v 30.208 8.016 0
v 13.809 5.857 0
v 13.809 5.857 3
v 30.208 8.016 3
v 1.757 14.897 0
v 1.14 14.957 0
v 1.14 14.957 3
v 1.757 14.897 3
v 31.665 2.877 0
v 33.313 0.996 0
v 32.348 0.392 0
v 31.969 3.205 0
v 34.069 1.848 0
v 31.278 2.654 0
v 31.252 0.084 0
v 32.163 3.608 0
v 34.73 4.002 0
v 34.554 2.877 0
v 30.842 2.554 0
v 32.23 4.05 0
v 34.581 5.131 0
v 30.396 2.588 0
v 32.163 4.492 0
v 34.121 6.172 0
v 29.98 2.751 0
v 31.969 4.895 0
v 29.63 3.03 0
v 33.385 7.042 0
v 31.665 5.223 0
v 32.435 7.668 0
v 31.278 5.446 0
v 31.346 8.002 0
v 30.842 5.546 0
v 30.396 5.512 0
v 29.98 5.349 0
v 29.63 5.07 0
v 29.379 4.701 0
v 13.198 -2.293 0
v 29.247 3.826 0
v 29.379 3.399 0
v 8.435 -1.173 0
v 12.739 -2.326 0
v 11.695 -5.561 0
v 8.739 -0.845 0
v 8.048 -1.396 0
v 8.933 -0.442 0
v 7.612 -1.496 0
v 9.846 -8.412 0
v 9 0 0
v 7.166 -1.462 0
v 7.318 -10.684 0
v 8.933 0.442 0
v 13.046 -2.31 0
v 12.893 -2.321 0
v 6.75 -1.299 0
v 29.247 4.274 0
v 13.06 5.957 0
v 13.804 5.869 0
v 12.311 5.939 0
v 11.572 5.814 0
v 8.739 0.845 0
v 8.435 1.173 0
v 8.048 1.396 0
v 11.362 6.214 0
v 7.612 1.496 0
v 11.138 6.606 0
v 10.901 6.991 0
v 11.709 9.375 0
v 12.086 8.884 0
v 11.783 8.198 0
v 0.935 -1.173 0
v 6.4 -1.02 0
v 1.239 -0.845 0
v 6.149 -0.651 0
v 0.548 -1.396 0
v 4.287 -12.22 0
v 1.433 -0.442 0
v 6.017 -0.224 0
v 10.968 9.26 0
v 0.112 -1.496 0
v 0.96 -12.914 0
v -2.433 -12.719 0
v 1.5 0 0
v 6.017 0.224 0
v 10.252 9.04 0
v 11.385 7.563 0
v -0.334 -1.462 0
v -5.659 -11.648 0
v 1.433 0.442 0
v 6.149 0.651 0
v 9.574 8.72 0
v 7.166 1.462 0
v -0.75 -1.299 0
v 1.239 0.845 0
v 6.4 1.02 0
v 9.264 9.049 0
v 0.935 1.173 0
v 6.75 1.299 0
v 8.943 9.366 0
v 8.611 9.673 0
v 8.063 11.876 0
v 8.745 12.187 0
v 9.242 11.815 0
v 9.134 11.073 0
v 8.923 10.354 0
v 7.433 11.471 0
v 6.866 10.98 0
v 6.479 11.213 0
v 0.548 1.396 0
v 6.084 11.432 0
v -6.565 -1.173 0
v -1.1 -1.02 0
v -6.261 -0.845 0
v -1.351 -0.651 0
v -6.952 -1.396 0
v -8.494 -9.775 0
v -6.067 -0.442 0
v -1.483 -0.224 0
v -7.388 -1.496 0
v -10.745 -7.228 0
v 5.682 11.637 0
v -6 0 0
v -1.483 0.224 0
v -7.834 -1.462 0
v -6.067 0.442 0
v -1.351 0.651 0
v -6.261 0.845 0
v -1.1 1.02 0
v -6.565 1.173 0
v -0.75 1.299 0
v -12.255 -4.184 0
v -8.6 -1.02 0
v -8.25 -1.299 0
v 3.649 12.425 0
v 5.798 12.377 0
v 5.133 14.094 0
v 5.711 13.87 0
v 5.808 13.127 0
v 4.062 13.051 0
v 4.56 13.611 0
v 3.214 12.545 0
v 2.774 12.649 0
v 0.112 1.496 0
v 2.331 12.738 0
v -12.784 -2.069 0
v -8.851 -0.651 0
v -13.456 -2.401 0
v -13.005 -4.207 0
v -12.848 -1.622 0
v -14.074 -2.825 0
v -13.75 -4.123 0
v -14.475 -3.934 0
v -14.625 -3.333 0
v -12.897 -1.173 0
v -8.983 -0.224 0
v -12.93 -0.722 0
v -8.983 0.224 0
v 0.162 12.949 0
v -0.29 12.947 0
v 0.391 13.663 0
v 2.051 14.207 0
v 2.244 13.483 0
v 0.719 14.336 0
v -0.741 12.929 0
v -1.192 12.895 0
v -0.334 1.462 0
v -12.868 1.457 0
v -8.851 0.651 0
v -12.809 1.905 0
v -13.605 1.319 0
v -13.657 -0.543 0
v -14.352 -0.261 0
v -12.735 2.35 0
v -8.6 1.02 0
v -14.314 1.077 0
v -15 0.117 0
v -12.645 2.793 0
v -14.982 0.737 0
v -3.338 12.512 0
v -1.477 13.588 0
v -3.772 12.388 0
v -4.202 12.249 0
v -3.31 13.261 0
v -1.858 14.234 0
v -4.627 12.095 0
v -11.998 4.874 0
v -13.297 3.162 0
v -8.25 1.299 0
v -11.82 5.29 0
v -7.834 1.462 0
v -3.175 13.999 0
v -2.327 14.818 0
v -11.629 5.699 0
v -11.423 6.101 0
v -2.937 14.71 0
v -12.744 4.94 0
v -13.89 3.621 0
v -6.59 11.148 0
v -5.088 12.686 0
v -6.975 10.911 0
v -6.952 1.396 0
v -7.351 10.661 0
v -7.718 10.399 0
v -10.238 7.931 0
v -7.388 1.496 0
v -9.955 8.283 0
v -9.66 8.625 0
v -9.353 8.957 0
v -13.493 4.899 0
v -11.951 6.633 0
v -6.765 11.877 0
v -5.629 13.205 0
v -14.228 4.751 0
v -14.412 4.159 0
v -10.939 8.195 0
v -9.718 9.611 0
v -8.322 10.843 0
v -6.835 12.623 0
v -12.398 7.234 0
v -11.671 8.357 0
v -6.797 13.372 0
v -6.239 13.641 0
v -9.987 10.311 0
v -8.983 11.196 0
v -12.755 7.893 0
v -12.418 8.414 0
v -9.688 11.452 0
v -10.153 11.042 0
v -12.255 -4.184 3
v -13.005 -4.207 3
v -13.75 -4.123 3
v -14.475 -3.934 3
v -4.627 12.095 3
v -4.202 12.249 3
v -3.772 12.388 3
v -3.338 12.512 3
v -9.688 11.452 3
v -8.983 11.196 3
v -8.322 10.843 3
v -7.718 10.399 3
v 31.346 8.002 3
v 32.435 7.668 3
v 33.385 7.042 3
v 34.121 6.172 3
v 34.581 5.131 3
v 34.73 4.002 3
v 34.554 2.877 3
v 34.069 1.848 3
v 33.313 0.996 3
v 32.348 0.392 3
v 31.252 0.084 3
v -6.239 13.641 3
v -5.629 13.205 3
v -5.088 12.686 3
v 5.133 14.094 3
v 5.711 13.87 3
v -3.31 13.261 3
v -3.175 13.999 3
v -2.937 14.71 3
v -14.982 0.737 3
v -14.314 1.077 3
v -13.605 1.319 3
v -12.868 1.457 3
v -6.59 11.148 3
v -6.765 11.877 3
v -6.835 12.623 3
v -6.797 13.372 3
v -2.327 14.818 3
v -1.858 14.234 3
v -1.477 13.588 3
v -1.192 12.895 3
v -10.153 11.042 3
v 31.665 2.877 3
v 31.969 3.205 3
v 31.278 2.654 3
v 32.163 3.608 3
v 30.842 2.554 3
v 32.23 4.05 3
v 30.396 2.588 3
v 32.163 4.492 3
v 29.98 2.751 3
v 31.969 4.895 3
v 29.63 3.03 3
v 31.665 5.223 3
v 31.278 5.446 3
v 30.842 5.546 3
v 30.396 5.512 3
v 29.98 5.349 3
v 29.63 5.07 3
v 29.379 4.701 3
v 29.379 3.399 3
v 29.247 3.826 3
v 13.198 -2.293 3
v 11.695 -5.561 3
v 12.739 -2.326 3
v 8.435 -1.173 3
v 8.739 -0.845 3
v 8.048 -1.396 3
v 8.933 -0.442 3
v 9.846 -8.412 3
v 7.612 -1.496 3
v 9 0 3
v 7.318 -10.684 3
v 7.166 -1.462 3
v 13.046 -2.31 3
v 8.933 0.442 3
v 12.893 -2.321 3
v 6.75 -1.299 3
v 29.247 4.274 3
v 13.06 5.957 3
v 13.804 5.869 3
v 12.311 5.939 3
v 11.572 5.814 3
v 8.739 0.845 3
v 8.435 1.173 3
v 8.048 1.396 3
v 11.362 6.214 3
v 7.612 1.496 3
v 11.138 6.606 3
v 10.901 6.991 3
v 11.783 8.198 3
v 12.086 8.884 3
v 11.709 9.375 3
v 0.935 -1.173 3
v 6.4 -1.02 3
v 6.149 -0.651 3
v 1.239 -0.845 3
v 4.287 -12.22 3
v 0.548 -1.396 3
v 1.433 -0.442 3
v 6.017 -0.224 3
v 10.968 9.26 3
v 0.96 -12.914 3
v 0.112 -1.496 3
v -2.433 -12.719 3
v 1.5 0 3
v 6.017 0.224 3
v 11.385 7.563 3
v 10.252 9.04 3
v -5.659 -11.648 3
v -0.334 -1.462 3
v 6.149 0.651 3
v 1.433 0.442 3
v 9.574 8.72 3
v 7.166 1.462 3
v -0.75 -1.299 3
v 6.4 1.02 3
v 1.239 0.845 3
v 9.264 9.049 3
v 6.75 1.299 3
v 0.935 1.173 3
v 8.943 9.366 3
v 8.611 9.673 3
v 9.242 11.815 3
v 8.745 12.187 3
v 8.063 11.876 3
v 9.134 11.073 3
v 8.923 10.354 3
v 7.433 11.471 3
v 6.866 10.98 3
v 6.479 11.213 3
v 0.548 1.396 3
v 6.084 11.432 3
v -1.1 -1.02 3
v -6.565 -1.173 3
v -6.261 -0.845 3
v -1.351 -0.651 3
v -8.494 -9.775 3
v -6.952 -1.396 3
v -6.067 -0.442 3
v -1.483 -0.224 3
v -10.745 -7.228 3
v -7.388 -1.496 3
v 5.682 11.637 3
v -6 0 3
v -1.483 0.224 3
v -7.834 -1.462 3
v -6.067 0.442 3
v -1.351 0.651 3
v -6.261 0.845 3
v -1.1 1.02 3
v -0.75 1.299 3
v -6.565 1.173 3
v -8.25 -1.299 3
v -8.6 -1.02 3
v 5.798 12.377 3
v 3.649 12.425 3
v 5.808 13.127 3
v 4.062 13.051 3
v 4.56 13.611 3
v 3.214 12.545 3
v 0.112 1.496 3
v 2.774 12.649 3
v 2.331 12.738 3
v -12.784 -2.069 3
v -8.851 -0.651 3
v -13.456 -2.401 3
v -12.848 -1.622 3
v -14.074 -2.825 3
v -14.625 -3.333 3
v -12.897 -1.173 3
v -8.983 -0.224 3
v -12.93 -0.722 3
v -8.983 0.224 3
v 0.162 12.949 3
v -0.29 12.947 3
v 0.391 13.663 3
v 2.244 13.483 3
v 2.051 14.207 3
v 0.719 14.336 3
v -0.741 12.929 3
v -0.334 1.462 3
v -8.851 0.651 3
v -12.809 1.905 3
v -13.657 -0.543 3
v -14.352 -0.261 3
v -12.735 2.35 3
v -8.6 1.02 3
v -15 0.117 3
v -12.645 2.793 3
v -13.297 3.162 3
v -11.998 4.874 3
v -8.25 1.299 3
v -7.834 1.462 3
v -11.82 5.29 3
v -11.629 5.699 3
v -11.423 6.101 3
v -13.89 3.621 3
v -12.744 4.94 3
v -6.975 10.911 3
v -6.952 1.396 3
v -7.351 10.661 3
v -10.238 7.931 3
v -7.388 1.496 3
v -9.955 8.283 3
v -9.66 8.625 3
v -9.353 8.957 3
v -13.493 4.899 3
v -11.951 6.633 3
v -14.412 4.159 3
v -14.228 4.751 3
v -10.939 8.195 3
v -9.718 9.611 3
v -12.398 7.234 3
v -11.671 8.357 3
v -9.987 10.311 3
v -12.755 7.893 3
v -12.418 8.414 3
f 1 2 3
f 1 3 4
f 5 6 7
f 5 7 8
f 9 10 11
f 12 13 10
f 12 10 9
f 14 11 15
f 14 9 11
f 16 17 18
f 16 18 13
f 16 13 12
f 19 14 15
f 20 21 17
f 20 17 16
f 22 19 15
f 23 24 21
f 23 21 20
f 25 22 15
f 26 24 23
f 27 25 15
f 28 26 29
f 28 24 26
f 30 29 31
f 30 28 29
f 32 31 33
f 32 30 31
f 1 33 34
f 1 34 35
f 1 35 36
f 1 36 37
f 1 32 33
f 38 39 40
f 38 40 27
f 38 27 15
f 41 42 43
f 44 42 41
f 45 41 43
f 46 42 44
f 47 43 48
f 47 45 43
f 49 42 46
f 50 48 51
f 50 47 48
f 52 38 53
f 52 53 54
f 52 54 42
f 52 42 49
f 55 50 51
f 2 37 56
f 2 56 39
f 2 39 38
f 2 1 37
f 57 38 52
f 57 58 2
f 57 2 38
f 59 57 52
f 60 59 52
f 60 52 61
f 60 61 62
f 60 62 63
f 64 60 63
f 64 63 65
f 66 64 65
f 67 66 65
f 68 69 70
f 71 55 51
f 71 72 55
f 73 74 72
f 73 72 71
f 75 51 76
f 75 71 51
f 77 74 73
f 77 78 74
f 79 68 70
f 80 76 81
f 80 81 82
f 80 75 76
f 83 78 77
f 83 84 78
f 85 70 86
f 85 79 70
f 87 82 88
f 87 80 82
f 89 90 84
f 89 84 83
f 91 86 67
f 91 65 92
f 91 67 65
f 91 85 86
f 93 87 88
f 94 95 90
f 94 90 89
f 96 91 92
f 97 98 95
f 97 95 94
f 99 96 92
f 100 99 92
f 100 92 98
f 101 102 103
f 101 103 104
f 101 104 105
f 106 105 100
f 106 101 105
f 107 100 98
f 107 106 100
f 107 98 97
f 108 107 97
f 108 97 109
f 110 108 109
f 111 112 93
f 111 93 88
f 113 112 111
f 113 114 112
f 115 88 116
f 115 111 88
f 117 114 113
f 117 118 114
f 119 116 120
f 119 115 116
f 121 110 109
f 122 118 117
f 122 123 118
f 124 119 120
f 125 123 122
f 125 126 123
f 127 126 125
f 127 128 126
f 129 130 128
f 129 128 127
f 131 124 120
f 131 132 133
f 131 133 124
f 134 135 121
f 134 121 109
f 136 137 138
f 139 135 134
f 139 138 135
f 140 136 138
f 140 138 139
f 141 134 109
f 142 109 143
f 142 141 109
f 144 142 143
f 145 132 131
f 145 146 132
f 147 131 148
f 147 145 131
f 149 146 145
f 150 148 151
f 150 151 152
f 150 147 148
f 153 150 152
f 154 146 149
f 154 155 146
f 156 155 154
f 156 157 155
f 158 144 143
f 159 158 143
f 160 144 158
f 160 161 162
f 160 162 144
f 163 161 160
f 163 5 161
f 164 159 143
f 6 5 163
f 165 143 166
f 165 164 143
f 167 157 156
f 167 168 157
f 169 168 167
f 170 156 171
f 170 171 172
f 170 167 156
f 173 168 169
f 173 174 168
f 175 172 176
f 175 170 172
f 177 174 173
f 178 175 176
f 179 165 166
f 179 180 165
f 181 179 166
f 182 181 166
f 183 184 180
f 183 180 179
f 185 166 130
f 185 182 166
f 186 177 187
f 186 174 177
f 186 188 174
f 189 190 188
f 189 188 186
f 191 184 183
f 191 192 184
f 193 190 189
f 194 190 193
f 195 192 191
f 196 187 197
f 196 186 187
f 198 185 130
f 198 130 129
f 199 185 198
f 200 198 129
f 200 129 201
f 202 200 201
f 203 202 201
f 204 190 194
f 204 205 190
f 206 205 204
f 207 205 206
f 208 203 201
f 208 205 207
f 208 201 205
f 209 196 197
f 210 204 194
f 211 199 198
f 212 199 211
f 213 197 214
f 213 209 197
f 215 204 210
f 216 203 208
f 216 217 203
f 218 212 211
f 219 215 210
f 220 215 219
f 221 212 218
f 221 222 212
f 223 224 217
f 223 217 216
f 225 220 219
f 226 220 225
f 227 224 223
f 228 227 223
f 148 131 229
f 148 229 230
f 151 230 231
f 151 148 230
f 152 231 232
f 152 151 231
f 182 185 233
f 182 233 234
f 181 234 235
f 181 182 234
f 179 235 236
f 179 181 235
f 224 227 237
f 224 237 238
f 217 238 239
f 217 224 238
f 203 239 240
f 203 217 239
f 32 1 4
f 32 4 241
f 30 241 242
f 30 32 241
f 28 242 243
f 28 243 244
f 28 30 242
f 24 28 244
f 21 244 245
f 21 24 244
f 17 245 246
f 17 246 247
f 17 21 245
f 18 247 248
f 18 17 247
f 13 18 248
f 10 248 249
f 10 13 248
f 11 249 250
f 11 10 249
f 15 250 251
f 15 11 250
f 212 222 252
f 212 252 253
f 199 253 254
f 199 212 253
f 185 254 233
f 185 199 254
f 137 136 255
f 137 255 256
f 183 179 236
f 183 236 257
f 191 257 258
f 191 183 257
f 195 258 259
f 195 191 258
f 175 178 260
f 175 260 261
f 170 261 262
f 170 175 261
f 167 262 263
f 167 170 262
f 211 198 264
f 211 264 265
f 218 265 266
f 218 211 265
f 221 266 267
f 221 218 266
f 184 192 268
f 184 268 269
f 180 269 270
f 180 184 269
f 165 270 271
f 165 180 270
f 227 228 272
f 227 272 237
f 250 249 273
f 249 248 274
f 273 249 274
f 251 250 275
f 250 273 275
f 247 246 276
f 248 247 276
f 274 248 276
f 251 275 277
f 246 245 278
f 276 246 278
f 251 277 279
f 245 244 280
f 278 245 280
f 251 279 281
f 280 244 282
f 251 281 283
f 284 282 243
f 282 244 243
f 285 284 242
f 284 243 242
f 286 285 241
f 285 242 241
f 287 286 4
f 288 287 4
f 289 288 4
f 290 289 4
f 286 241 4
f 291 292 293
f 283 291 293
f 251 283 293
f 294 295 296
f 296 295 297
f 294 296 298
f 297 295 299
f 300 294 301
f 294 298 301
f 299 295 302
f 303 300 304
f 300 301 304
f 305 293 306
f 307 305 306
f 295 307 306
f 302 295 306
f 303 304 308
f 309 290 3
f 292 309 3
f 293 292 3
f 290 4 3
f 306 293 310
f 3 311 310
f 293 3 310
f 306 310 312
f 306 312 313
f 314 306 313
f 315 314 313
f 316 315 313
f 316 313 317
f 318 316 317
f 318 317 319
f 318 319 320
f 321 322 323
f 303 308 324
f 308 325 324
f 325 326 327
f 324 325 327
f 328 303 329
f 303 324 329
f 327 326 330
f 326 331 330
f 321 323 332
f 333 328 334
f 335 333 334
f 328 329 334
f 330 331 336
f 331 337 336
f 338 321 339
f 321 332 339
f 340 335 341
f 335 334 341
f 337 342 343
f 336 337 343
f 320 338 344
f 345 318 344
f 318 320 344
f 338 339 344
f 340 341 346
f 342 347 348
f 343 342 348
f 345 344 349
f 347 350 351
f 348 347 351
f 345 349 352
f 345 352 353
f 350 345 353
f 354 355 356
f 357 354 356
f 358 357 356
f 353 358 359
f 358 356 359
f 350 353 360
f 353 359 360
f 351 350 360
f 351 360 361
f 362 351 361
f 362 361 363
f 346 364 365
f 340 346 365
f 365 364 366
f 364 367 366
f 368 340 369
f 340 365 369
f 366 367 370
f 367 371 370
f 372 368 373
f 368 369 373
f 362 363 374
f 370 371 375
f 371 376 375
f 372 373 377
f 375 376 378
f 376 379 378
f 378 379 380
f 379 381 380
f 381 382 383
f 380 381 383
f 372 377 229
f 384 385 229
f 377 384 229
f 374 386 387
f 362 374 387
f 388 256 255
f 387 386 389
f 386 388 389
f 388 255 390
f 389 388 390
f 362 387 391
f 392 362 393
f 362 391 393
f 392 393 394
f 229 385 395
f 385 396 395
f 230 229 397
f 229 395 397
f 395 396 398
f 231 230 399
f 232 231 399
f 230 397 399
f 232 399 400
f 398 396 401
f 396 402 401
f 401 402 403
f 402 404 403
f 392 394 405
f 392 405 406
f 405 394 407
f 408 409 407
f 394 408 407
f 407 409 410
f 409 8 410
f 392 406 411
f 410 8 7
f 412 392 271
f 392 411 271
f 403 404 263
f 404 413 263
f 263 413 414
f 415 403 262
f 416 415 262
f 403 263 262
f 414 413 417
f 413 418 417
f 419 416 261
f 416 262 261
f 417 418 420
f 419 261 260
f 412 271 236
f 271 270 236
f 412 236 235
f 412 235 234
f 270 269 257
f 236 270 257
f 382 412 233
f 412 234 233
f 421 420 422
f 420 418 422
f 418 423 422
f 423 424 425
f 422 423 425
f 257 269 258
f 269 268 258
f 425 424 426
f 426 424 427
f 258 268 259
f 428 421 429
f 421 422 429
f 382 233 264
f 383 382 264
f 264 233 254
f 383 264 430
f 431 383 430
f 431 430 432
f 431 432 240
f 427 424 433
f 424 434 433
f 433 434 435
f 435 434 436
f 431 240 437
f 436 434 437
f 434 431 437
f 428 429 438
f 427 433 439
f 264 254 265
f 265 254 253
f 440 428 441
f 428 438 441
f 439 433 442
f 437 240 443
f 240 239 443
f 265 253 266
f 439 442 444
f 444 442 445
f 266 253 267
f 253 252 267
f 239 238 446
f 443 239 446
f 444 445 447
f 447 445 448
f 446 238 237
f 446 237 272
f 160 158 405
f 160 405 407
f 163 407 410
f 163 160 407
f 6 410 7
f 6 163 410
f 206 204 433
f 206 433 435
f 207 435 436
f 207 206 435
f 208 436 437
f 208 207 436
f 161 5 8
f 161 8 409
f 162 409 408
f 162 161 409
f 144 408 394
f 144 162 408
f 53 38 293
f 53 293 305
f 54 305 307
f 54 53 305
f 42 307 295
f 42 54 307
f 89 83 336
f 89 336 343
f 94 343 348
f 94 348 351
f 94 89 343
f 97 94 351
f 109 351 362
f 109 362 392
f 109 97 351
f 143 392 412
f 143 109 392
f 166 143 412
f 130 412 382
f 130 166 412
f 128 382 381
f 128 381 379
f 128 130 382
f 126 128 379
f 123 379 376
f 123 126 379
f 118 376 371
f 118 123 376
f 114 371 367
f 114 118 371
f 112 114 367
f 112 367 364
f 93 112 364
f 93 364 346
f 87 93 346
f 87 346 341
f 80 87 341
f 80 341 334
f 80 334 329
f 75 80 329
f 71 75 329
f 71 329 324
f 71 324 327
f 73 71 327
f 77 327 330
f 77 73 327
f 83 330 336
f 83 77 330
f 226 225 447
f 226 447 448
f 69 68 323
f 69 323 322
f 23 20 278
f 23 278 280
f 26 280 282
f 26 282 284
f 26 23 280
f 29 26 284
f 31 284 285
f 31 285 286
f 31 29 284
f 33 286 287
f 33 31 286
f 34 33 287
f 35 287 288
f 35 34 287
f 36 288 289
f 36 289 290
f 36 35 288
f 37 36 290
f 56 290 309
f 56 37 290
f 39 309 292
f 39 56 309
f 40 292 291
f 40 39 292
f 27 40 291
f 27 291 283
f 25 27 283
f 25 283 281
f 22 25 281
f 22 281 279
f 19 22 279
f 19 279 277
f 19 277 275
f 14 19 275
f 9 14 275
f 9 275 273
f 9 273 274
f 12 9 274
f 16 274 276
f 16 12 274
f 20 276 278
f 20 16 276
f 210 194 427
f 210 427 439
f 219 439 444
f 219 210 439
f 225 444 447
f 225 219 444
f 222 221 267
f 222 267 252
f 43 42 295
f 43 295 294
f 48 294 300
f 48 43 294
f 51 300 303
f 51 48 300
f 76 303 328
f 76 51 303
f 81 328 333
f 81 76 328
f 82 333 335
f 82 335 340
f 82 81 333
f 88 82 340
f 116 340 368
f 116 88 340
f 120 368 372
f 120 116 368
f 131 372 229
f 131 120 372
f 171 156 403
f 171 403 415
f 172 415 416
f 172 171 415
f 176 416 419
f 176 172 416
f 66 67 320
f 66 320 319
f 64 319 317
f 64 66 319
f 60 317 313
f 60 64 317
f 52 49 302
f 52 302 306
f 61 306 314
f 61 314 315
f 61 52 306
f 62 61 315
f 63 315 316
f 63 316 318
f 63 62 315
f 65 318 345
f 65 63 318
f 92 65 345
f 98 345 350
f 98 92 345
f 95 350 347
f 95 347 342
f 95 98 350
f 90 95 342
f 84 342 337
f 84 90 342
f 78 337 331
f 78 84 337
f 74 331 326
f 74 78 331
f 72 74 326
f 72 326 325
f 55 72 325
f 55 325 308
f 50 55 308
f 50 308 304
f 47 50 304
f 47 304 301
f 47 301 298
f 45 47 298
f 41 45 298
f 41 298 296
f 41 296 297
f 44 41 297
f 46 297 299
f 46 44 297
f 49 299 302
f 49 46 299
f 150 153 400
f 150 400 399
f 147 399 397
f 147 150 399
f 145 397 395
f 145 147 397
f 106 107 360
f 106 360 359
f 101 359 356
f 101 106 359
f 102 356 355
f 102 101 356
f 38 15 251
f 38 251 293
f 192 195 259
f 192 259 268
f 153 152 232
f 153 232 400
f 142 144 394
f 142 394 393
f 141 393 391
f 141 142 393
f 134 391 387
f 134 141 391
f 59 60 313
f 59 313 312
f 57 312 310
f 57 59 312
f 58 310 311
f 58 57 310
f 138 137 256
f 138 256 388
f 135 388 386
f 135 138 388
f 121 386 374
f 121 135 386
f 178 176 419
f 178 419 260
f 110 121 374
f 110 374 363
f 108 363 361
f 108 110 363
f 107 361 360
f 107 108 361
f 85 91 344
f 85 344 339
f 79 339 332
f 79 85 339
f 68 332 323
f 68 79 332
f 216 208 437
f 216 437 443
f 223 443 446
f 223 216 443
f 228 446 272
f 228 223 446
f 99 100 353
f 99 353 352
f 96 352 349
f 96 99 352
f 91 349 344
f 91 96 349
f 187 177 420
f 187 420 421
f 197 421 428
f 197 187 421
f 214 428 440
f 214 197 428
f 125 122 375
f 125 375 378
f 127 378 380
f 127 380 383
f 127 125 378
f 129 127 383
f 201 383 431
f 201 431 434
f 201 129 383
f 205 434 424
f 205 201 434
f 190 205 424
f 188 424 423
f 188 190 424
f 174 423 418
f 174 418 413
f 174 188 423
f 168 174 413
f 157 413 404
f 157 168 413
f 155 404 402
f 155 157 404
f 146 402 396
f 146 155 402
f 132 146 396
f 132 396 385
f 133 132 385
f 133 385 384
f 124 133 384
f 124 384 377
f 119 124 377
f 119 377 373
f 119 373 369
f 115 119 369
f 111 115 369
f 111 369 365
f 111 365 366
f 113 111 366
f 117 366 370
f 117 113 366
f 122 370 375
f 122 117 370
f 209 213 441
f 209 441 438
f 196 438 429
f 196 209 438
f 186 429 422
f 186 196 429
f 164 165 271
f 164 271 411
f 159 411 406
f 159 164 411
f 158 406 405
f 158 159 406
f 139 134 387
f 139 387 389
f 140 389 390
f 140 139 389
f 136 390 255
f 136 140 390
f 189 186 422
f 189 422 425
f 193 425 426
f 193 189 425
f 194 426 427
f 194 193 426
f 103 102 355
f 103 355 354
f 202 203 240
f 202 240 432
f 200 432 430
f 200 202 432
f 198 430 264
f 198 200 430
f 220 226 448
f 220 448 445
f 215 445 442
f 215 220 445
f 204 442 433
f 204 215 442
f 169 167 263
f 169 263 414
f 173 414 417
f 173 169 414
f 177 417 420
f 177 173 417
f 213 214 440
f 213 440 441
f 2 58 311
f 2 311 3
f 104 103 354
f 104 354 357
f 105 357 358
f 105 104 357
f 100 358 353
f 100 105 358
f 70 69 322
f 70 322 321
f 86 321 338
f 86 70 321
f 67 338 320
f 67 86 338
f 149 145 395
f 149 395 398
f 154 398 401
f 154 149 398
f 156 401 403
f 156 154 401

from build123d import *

# Parameters (mm, degrees)
SKETCH1_R           = 1.5
BOSS_EXTRUDE1_DEPTH = 3


with BuildPart() as part:
    # Sketch1 → Boss-Extrude1 (new body)
    with BuildSketch(Plane.XY):
        with BuildLine():
            Line((31.252104769, 0.084220555), (13.197893843, -2.292661406))
            ThreePointArc((13.197893843, -2.292661406), (12.969095602, -2.316113876), (12.73932764, -2.326377285))
            ThreePointArc((12.73932764, -2.326377285), (0.959824701, -12.914380997), (-12.255459075, -4.184043841))
            ThreePointArc((-12.255459075, -4.184043841), (-13.378578492, -4.178547185), (-14.474839872, -3.934337388))
            Line((-14.474839872, -3.934337388), (-14.625059689, -3.332810991))
            ThreePointArc((-14.625059689, -3.332810991), (-13.772322314, -2.601875695), (-12.783651334, -2.068999412))
            ThreePointArc((-12.783651334, -2.068999412), (-12.874361077, -1.397614704), (-12.929834926, -0.722404858))
            ThreePointArc((-12.929834926, -0.722404858), (-14.009823049, -0.414098041), (-14.999545068, 0.116823575))
            Line((-14.999545068, 0.116823575), (-14.981904447, 0.736572564))
            ThreePointArc((-14.981904447, 0.736572564), (-13.963584904, 1.210337006), (-12.867808226, 1.456712552))
            ThreePointArc((-12.867808226, 1.456712552), (-12.774016779, 2.12767369), (-12.645264071, 2.792811588))
            ThreePointArc((-12.645264071, 2.792811588), (-13.60202312, 3.381062861), (-14.411802625, 4.159320268))
            Line((-14.411802625, 4.159320268), (-14.22760989, 4.7513279))
            ThreePointArc((-14.22760989, 4.7513279), (-13.119232281, 4.932784547), (-11.997618648, 4.87438681))
            ThreePointArc((-11.997618648, 4.87438681), (-11.726282094, 5.495162259), (-11.422851828, 6.100897975))
            ThreePointArc((-11.422851828, 6.100897975), (-12.185423363, 6.925465798), (-12.755202711, 7.893339205))
            Line((-12.755202711, 7.893339205), (-12.418118595, 8.413698983))
            ThreePointArc((-12.418118595, 8.413698983), (-11.301886217, 8.289390025), (-10.23762058, 7.930550098))
            ThreePointArc((-10.23762058, 7.930550098), (-9.80886271, 8.455099783), (-9.353258921, 8.95650867))
            ThreePointArc((-9.353258921, 8.95650867), (-9.865086498, 9.956238618), (-10.152607763, 11.041945282))
            Line((-10.152607763, 11.041945282), (-9.687632252, 11.452064502))
            ThreePointArc((-9.687632252, 11.452064502), (-8.646330954, 11.031209366), (-7.718345028, 10.398540764))
            ThreePointArc((-7.718345028, 10.398540764), (-7.163964851, 10.787961235), (-6.589977589, 11.147856089))
            ThreePointArc((-6.589977589, 11.147856089), (-6.813101299, 12.248602767), (-6.797040342, 13.371620791))
            Line((-6.797040342, 13.371620791), (-6.238658543, 13.641082786))
            ThreePointArc((-6.238658543, 13.641082786), (-5.349516879, 12.954894372), (-4.626635134, 12.095319232))
            ThreePointArc((-4.626635134, 12.095319232), (-3.987748493, 12.320728954), (-3.337947765, 12.51241802))
            ThreePointArc((-3.337947765, 12.51241802), (-3.255819543, 13.632544082), (-2.937367534, 14.709584358))
            Line((-2.937367534, 14.709584358), (-2.32699207, 14.818404364))
            ThreePointArc((-2.32699207, 14.818404364), (-1.65595361, 13.917774128), (-1.191788878, 12.895043205))
            ThreePointArc((-1.191788878, 12.895043205), (-0.515779071, 12.93972457), (0.161642374, 12.948991148))
            ThreePointArc((0.161642374, 12.948991148), (0.542931453, 14.005421967), (1.140156387, 14.956605344))
            Line((1.140156387, 14.956605344), (1.757256759, 14.89671268))
            ThreePointArc((1.757256759, 14.89671268), (2.160424164, 13.848436246), (2.331446907, 12.738400815))
            ThreePointArc((2.331446907, 12.738400815), (2.994443325, 12.59904001), (3.649244238, 12.425196839))
            ThreePointArc((3.649244238, 12.425196839), (4.301415708, 13.339581776), (5.133120125, 14.094363334))
            Line((5.133120125, 14.094363334), (5.711177894, 13.870199965))
            ThreePointArc((5.711177894, 13.870199965), (5.81657316, 12.752023201), (5.681769941, 11.63700951))
            ThreePointArc((5.681769941, 11.63700951), (6.282581558, 11.323942289), (6.86619835, 10.979882523))
            ThreePointArc((6.86619835, 10.979882523), (7.740883637, 11.684405828), (8.745383825, 12.186806873))
            Line((8.745383825, 12.186806873), (9.241527091, 11.81499797))
            ThreePointArc((9.241527091, 11.81499797), (9.041333534, 10.709850931), (8.610702091, 9.672554446))
            ThreePointArc((8.610702091, 9.672554446), (9.104769458, 9.208999572), (9.573917942, 8.720240549))
            ThreePointArc((9.573917942, 8.720240549), (10.606245638, 9.162650954), (11.709042415, 9.375410697))
            Line((11.709042415, 9.375410697), (12.086474501, 8.883531626))
            ThreePointArc((12.086474501, 8.883531626), (11.595539562, 7.873378012), (10.901017858, 6.990730267))
            ThreePointArc((10.901017858, 6.990730267), (11.251698258, 6.411067486), (11.571583838, 5.813858226))
            ThreePointArc((11.571583838, 5.813858226), (12.684990922, 5.961344174), (13.804294894, 5.868683199))
            Line((13.804294894, 5.868683199), (13.809047255, 5.856830152))
            Line((13.809047255, 5.856830152), (30.207895231, 8.015779445))
            ThreePointArc((30.207895231, 8.015779445), (34.695779445, 4.572104769), (31.252104769, 0.084220555))
        make_face()
        Circle(SKETCH1_R, mode=Mode.SUBTRACT)
        with Locations((7.5, 0)):
            Circle(SKETCH1_R, mode=Mode.SUBTRACT)
        with Locations((-7.5, 0)):
            Circle(SKETCH1_R, mode=Mode.SUBTRACT)
        with Locations((30.73, 4.05)):
            Circle(SKETCH1_R, mode=Mode.SUBTRACT)
    extrude(amount=BOSS_EXTRUDE1_DEPTH)


solid = part.part
